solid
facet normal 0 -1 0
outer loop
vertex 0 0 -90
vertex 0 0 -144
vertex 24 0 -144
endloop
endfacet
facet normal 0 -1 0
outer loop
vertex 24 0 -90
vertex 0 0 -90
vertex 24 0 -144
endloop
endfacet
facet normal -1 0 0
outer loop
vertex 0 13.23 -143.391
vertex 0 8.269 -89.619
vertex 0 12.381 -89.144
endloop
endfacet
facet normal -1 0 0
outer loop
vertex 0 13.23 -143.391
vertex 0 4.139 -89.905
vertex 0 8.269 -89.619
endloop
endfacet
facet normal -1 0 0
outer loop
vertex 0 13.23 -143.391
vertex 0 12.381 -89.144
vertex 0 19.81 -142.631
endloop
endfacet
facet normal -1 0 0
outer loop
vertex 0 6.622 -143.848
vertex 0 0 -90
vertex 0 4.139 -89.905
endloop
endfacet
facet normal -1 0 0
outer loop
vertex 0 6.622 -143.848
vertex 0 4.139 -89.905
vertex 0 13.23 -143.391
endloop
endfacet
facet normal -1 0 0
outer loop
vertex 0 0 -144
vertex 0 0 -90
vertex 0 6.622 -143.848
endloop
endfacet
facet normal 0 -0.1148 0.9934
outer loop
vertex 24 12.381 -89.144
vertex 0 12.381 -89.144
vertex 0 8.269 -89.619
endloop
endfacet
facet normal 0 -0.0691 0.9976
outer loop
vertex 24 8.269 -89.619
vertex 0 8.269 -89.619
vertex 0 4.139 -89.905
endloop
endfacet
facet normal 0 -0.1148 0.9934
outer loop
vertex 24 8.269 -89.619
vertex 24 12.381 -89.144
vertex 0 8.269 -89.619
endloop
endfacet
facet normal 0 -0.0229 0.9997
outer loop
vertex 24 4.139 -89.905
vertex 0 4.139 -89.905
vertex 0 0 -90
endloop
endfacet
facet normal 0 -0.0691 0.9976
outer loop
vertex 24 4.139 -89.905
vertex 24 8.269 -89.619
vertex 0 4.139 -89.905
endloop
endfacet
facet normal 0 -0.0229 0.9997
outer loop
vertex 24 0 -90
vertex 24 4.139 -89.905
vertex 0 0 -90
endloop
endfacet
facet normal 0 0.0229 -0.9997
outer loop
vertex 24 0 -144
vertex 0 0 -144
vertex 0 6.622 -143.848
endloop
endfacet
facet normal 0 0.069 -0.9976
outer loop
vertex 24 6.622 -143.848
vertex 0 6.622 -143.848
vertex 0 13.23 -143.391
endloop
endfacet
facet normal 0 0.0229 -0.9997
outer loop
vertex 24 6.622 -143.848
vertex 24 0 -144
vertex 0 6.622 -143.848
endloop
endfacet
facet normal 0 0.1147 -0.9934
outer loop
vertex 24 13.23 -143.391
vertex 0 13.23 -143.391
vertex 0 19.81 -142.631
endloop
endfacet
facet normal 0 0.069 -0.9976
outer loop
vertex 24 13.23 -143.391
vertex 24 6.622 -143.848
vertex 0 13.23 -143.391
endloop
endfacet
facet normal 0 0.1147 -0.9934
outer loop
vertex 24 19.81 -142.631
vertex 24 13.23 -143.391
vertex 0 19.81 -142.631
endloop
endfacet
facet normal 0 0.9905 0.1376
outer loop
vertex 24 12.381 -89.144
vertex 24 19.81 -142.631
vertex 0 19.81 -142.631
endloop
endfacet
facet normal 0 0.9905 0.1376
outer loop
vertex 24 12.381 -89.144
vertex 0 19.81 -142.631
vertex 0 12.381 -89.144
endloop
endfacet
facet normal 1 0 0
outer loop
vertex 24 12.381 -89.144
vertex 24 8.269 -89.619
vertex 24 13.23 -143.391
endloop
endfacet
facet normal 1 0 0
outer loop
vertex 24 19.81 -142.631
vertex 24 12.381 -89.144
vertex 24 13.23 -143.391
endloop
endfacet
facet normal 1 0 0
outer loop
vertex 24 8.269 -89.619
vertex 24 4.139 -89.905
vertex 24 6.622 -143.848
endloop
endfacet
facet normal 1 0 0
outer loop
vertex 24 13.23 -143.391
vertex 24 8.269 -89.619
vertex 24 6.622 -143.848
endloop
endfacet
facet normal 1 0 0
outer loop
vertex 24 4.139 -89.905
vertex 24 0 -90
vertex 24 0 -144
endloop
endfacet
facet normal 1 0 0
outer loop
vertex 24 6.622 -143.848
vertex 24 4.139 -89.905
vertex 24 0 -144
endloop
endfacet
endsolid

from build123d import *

# Parameters (mm, degrees)
CROQUIS1_W              = 24
CROQUIS1_H              = 144
SALIENTE_EXTRUIR1_DEPTH = 20
CORTAR_EXTRUIR2_DEPTH   = 148.349923651
CROQUIS7_W              = 24
CROQUIS7_H              = 40.261393694
CROQUIS4_W              = 24
CROQUIS4_H              = 90


with BuildPart() as part:
    # Croquis1 → Saliente-Extruir1 (new body)
    with BuildSketch(Plane(origin=(0, 0, 0), x_dir=(1, 0, 0), z_dir=(0, 1, 0))):
        with Locations((12, 72)):
            Rectangle(CROQUIS1_W, CROQUIS1_H)
    extrude(amount=SALIENTE_EXTRUIR1_DEPTH)

    # Croquis3 → Cortar-Extruir2 (cut, through all)
    with BuildSketch(Plane(origin=(24, 0, 0), x_dir=(0, 0, -1), z_dir=(1, 0, 0))):
        Polygon((144, 20), (0, 0), (0, 20), align=None)
    extrude(amount=-CORTAR_EXTRUIR2_DEPTH, mode=Mode.SUBTRACT)

    # Croquis7 → Cortar-Revolución5 (revolve, cut)
    with BuildSketch(Plane.XZ):
        with Locations((12, -164.130696847)):
            Rectangle(CROQUIS7_W, CROQUIS7_H)
    revolve(axis=Axis((0, 0, 0), (1, 0, 0)), mode=Mode.SUBTRACT)

    # Croquis4 → Cortar-Revolución3 (revolve, cut)
    with BuildSketch(Plane.XZ):
        with Locations((12, -45)):
            Rectangle(CROQUIS4_W, CROQUIS4_H)
    revolve(axis=Axis((24, 0, 0), (-1, 0, 0)), mode=Mode.SUBTRACT)


solid = part.part
